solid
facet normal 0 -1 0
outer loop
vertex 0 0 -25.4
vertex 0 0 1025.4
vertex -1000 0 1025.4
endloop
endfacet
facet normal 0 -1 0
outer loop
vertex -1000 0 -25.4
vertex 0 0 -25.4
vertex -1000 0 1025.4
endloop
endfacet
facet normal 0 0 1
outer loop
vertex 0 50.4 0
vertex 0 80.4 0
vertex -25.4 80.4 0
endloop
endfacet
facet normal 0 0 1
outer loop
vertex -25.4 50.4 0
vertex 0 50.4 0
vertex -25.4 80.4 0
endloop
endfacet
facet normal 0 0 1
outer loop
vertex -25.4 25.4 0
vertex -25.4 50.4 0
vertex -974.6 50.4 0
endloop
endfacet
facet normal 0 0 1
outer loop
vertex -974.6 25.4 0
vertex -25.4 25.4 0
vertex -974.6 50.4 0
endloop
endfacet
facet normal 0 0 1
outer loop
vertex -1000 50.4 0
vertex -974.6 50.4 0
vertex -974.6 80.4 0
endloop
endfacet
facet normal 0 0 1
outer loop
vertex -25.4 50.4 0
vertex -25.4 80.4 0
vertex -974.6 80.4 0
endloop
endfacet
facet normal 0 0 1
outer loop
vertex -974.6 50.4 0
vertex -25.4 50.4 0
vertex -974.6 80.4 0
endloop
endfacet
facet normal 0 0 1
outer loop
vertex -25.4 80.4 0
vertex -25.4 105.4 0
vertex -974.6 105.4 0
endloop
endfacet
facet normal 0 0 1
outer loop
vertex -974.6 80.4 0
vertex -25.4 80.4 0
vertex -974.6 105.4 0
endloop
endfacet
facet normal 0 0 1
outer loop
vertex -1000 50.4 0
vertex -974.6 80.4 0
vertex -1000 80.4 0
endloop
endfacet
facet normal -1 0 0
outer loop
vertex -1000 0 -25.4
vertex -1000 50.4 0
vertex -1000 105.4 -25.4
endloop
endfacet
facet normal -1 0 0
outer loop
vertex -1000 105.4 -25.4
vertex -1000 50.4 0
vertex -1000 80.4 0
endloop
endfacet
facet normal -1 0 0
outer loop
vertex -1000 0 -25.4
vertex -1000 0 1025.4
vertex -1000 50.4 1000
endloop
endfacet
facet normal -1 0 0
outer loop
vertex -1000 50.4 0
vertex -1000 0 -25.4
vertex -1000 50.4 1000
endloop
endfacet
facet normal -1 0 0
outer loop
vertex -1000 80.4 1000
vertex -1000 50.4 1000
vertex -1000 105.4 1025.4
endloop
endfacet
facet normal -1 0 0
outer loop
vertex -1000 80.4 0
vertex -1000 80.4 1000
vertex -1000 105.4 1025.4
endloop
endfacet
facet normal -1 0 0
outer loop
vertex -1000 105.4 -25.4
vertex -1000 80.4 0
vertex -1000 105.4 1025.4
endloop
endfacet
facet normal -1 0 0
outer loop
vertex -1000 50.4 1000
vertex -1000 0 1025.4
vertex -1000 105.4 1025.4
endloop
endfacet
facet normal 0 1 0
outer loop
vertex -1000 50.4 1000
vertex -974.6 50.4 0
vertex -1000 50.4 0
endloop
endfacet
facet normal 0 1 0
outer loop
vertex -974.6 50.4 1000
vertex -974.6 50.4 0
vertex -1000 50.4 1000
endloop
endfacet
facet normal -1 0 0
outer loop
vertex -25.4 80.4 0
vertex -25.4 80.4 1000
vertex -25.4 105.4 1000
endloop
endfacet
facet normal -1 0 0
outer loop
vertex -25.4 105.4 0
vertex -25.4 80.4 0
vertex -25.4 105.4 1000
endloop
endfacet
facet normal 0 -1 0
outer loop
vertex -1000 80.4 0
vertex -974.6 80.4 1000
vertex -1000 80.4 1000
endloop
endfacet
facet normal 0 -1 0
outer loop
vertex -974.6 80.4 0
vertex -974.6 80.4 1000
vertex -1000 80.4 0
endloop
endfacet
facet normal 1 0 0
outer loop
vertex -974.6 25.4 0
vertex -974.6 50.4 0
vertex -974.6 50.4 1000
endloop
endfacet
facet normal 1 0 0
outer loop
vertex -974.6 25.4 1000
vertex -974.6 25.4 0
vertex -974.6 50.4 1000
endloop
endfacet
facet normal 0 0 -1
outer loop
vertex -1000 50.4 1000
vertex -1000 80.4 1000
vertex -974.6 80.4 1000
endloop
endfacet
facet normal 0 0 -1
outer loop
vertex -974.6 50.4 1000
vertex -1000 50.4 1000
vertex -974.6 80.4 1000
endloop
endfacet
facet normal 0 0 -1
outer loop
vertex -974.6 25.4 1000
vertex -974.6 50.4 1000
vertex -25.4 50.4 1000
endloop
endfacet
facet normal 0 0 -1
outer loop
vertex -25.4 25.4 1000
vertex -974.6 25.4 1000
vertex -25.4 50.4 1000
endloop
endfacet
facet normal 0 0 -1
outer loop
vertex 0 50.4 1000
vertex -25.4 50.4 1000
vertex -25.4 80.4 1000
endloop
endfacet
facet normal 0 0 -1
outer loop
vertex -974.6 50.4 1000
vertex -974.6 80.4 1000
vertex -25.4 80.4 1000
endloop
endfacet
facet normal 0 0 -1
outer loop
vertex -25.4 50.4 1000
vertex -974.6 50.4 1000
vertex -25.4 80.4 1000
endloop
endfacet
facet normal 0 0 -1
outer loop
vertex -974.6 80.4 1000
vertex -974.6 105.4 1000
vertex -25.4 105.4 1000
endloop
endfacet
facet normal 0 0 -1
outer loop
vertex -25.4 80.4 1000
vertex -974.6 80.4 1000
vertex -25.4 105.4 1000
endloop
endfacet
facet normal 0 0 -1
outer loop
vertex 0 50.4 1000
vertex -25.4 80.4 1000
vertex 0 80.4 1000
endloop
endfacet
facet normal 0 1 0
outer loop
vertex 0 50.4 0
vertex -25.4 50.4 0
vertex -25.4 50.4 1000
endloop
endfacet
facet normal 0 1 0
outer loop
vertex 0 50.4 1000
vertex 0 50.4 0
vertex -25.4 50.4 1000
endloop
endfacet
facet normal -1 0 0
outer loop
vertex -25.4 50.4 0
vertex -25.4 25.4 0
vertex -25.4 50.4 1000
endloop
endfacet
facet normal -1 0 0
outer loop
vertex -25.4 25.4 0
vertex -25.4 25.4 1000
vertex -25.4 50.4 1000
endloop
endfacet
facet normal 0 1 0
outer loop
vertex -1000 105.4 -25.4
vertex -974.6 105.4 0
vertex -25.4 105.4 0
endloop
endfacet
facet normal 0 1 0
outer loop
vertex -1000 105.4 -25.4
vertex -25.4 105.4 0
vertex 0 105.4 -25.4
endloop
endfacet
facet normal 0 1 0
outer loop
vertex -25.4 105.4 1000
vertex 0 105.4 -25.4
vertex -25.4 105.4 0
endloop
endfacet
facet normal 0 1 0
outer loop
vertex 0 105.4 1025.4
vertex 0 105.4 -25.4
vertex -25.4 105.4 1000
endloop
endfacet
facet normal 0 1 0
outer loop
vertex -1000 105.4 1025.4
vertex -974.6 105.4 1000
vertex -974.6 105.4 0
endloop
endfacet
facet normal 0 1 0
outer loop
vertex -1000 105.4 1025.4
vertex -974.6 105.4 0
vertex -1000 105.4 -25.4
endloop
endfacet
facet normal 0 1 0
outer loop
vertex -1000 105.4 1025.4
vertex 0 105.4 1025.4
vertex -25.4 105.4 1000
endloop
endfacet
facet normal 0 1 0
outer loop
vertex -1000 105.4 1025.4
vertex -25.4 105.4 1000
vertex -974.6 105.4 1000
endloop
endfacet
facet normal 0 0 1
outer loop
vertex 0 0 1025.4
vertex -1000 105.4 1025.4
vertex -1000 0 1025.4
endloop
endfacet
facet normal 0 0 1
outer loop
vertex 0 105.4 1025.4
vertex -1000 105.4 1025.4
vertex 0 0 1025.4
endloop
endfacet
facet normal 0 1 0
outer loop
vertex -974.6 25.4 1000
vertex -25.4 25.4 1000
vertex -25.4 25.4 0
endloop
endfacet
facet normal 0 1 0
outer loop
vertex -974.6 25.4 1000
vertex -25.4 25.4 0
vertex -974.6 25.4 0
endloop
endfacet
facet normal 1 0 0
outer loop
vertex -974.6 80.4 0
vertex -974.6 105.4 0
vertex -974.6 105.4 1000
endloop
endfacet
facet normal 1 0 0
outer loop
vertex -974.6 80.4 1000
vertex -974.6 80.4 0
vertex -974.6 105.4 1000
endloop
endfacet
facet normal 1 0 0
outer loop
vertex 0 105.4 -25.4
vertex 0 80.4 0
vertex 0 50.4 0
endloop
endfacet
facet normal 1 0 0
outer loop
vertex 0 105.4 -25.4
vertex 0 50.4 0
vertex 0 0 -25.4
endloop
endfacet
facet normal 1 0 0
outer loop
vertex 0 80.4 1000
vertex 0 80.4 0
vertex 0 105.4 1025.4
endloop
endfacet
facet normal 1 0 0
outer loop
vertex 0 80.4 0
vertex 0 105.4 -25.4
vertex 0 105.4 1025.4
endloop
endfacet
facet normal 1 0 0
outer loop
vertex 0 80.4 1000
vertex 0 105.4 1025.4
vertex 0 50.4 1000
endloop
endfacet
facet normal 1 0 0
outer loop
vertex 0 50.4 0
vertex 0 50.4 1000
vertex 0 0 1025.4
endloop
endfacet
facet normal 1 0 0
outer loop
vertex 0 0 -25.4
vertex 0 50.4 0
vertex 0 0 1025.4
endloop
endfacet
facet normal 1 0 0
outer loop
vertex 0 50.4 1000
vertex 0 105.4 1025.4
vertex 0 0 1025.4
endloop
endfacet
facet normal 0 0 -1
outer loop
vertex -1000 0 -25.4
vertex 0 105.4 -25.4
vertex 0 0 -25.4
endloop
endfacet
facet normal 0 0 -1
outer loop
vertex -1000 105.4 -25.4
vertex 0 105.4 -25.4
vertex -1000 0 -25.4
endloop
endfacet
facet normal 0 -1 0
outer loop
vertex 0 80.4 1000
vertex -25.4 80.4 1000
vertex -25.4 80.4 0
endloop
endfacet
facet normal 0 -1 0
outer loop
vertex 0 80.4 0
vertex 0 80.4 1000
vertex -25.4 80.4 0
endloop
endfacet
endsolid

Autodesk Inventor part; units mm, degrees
sketch "Sketch1" plane through (0, 0, 0) normal (0, 1, 0) x (-1, 0, 0)
  line L0 (0, 0) -> (1000, 0)
  line L1 (1000, 0) -> (1000, 1000)
  line L2 (1000, 1000) -> (0, 1000)
  line L3 (0, 1000) -> (0, 0)
  dimension "d0" = 1000
  dimension "d1" = 1000
extrude "Extrusion1" add sketch "Sketch1" along normal blind 25.4
sketch "Sketch2" plane through (0, 0, 0) normal (1, 0, 0) x (0, 1, 0)
  line L0 (25.4, 1000) -> (25.4, 0) projected
  line L1 (25.4, 0) -> (105.4, 0)
  line L2 (105.4, 0) -> (105.4, 1000)
  line L3 (105.4, 1000) -> (25.4, 1000)
  line L4 (25.4, 1000) -> (25.4, 0)
  point P0 (0, 0)
  dimension "d4" = 80
  dimension "d5" = 1000
extrude "Extrusion2" add sketch "Sketch2" against normal blind 25.4
sketch "Sketch3" plane through (-1000, 0, 0) normal (-1, 0, 0) x (0, 0, 1)
  line L0 (1000, 0) -> (1000, 25.4) projected
  line L1 (1000, 105.4) -> (0, 105.4) projected
  line L2 (1000, 25.4) -> (0, 25.4)
  line L3 (0, 25.4) -> (0, 105.4)
  line L4 (0, 105.4) -> (1000, 105.4)
  line L5 (1000, 105.4) -> (1000, 25.4)
  point P0 (0, 0)
  dimension "d8" = 1000
  dimension "d9" = 80
extrude "Extrusion3" add sketch "Sketch3" against normal blind 25.4
sketch "Sketch4" plane through (-25.4, 0, 0) normal (-1, 0, 0) x (0, 0, 1)
  line L0 (0, 50.4) -> (1000, 50.4)
  line L1 (1000, 50.4) -> (1000, 80.4)
  line L2 (1000, 80.4) -> (0, 80.4)
  line L3 (0, 80.4) -> (0, 50.4)
  point P0 (0, 0)
  dimension "d12" = 1000
  dimension "d13" = 30
extrude "Extrusion4" cut sketch "Sketch4" against normal blind 25.4
sketch "Sketch5" plane through (-974.6, 0, 0) normal (1, 0, 0) x (0, 0, -1)
  line L0 (0, 25.4) -> (0, 105.4) projected
  line L1 (0, 50.4) -> (-1000, 50.4)
  line L2 (-1000, 50.4) -> (-1000, 80.4)
  line L3 (-1000, 80.4) -> (0, 80.4)
  line L4 (0, 80.4) -> (0, 50.4)
  line L5 (0, 25.4) -> (-1000, 25.4) projected
  point P0 (0, 0)
  point P1 (0, 80.4)
  dimension "d16" = 1000
  dimension "d17" = 30
  dimension "d18" = 25
extrude "Extrusion5" cut sketch "Sketch5" against normal blind 25.4
ref_plane "Work Plane1" through (-1000, 65.4, 1000) normal (0, 1, 0) x (1, 0, 0)
sketch "Sketch6" plane through (-1000, 0, 1000) normal (0, 0, 1) x (1, 0, 0)
  line L0 (0, 80.4) -> (0, 105.4) projected
  line L1 (1000, 0) -> (0, 0)
  line L2 (0, 0) -> (0, 105.4)
  line L3 (0, 105.4) -> (1000, 105.4)
  line L4 (1000, 105.4) -> (1000, 0)
extrude "Extrusion6" add sketch "Sketch6" along normal blind 25.4
sketch "Sketch7" plane through (0, 0, 0) normal (0, 0, -1) x (-1, 0, 0)
  line L0 (0, 105.4) -> (1000, 105.4) projected
  line L1 (0, 0) -> (1000, 0)
  line L2 (1000, 0) -> (1000, 105.4)
  line L3 (1000, 105.4) -> (0, 105.4)
  line L4 (0, 105.4) -> (0, 0)
extrude "Extrusion7" add sketch "Sketch7" along normal blind 25.4
ref_plane "Work Plane2" through (-1000, 0, 500) normal (0, 0, 1) x (1, 0, 0)
ref_plane "Work Plane3" through (0, 0, 1025.4) normal (1, 0, 0) x (0, 0, -1)
properties material "Iron, Cast"
